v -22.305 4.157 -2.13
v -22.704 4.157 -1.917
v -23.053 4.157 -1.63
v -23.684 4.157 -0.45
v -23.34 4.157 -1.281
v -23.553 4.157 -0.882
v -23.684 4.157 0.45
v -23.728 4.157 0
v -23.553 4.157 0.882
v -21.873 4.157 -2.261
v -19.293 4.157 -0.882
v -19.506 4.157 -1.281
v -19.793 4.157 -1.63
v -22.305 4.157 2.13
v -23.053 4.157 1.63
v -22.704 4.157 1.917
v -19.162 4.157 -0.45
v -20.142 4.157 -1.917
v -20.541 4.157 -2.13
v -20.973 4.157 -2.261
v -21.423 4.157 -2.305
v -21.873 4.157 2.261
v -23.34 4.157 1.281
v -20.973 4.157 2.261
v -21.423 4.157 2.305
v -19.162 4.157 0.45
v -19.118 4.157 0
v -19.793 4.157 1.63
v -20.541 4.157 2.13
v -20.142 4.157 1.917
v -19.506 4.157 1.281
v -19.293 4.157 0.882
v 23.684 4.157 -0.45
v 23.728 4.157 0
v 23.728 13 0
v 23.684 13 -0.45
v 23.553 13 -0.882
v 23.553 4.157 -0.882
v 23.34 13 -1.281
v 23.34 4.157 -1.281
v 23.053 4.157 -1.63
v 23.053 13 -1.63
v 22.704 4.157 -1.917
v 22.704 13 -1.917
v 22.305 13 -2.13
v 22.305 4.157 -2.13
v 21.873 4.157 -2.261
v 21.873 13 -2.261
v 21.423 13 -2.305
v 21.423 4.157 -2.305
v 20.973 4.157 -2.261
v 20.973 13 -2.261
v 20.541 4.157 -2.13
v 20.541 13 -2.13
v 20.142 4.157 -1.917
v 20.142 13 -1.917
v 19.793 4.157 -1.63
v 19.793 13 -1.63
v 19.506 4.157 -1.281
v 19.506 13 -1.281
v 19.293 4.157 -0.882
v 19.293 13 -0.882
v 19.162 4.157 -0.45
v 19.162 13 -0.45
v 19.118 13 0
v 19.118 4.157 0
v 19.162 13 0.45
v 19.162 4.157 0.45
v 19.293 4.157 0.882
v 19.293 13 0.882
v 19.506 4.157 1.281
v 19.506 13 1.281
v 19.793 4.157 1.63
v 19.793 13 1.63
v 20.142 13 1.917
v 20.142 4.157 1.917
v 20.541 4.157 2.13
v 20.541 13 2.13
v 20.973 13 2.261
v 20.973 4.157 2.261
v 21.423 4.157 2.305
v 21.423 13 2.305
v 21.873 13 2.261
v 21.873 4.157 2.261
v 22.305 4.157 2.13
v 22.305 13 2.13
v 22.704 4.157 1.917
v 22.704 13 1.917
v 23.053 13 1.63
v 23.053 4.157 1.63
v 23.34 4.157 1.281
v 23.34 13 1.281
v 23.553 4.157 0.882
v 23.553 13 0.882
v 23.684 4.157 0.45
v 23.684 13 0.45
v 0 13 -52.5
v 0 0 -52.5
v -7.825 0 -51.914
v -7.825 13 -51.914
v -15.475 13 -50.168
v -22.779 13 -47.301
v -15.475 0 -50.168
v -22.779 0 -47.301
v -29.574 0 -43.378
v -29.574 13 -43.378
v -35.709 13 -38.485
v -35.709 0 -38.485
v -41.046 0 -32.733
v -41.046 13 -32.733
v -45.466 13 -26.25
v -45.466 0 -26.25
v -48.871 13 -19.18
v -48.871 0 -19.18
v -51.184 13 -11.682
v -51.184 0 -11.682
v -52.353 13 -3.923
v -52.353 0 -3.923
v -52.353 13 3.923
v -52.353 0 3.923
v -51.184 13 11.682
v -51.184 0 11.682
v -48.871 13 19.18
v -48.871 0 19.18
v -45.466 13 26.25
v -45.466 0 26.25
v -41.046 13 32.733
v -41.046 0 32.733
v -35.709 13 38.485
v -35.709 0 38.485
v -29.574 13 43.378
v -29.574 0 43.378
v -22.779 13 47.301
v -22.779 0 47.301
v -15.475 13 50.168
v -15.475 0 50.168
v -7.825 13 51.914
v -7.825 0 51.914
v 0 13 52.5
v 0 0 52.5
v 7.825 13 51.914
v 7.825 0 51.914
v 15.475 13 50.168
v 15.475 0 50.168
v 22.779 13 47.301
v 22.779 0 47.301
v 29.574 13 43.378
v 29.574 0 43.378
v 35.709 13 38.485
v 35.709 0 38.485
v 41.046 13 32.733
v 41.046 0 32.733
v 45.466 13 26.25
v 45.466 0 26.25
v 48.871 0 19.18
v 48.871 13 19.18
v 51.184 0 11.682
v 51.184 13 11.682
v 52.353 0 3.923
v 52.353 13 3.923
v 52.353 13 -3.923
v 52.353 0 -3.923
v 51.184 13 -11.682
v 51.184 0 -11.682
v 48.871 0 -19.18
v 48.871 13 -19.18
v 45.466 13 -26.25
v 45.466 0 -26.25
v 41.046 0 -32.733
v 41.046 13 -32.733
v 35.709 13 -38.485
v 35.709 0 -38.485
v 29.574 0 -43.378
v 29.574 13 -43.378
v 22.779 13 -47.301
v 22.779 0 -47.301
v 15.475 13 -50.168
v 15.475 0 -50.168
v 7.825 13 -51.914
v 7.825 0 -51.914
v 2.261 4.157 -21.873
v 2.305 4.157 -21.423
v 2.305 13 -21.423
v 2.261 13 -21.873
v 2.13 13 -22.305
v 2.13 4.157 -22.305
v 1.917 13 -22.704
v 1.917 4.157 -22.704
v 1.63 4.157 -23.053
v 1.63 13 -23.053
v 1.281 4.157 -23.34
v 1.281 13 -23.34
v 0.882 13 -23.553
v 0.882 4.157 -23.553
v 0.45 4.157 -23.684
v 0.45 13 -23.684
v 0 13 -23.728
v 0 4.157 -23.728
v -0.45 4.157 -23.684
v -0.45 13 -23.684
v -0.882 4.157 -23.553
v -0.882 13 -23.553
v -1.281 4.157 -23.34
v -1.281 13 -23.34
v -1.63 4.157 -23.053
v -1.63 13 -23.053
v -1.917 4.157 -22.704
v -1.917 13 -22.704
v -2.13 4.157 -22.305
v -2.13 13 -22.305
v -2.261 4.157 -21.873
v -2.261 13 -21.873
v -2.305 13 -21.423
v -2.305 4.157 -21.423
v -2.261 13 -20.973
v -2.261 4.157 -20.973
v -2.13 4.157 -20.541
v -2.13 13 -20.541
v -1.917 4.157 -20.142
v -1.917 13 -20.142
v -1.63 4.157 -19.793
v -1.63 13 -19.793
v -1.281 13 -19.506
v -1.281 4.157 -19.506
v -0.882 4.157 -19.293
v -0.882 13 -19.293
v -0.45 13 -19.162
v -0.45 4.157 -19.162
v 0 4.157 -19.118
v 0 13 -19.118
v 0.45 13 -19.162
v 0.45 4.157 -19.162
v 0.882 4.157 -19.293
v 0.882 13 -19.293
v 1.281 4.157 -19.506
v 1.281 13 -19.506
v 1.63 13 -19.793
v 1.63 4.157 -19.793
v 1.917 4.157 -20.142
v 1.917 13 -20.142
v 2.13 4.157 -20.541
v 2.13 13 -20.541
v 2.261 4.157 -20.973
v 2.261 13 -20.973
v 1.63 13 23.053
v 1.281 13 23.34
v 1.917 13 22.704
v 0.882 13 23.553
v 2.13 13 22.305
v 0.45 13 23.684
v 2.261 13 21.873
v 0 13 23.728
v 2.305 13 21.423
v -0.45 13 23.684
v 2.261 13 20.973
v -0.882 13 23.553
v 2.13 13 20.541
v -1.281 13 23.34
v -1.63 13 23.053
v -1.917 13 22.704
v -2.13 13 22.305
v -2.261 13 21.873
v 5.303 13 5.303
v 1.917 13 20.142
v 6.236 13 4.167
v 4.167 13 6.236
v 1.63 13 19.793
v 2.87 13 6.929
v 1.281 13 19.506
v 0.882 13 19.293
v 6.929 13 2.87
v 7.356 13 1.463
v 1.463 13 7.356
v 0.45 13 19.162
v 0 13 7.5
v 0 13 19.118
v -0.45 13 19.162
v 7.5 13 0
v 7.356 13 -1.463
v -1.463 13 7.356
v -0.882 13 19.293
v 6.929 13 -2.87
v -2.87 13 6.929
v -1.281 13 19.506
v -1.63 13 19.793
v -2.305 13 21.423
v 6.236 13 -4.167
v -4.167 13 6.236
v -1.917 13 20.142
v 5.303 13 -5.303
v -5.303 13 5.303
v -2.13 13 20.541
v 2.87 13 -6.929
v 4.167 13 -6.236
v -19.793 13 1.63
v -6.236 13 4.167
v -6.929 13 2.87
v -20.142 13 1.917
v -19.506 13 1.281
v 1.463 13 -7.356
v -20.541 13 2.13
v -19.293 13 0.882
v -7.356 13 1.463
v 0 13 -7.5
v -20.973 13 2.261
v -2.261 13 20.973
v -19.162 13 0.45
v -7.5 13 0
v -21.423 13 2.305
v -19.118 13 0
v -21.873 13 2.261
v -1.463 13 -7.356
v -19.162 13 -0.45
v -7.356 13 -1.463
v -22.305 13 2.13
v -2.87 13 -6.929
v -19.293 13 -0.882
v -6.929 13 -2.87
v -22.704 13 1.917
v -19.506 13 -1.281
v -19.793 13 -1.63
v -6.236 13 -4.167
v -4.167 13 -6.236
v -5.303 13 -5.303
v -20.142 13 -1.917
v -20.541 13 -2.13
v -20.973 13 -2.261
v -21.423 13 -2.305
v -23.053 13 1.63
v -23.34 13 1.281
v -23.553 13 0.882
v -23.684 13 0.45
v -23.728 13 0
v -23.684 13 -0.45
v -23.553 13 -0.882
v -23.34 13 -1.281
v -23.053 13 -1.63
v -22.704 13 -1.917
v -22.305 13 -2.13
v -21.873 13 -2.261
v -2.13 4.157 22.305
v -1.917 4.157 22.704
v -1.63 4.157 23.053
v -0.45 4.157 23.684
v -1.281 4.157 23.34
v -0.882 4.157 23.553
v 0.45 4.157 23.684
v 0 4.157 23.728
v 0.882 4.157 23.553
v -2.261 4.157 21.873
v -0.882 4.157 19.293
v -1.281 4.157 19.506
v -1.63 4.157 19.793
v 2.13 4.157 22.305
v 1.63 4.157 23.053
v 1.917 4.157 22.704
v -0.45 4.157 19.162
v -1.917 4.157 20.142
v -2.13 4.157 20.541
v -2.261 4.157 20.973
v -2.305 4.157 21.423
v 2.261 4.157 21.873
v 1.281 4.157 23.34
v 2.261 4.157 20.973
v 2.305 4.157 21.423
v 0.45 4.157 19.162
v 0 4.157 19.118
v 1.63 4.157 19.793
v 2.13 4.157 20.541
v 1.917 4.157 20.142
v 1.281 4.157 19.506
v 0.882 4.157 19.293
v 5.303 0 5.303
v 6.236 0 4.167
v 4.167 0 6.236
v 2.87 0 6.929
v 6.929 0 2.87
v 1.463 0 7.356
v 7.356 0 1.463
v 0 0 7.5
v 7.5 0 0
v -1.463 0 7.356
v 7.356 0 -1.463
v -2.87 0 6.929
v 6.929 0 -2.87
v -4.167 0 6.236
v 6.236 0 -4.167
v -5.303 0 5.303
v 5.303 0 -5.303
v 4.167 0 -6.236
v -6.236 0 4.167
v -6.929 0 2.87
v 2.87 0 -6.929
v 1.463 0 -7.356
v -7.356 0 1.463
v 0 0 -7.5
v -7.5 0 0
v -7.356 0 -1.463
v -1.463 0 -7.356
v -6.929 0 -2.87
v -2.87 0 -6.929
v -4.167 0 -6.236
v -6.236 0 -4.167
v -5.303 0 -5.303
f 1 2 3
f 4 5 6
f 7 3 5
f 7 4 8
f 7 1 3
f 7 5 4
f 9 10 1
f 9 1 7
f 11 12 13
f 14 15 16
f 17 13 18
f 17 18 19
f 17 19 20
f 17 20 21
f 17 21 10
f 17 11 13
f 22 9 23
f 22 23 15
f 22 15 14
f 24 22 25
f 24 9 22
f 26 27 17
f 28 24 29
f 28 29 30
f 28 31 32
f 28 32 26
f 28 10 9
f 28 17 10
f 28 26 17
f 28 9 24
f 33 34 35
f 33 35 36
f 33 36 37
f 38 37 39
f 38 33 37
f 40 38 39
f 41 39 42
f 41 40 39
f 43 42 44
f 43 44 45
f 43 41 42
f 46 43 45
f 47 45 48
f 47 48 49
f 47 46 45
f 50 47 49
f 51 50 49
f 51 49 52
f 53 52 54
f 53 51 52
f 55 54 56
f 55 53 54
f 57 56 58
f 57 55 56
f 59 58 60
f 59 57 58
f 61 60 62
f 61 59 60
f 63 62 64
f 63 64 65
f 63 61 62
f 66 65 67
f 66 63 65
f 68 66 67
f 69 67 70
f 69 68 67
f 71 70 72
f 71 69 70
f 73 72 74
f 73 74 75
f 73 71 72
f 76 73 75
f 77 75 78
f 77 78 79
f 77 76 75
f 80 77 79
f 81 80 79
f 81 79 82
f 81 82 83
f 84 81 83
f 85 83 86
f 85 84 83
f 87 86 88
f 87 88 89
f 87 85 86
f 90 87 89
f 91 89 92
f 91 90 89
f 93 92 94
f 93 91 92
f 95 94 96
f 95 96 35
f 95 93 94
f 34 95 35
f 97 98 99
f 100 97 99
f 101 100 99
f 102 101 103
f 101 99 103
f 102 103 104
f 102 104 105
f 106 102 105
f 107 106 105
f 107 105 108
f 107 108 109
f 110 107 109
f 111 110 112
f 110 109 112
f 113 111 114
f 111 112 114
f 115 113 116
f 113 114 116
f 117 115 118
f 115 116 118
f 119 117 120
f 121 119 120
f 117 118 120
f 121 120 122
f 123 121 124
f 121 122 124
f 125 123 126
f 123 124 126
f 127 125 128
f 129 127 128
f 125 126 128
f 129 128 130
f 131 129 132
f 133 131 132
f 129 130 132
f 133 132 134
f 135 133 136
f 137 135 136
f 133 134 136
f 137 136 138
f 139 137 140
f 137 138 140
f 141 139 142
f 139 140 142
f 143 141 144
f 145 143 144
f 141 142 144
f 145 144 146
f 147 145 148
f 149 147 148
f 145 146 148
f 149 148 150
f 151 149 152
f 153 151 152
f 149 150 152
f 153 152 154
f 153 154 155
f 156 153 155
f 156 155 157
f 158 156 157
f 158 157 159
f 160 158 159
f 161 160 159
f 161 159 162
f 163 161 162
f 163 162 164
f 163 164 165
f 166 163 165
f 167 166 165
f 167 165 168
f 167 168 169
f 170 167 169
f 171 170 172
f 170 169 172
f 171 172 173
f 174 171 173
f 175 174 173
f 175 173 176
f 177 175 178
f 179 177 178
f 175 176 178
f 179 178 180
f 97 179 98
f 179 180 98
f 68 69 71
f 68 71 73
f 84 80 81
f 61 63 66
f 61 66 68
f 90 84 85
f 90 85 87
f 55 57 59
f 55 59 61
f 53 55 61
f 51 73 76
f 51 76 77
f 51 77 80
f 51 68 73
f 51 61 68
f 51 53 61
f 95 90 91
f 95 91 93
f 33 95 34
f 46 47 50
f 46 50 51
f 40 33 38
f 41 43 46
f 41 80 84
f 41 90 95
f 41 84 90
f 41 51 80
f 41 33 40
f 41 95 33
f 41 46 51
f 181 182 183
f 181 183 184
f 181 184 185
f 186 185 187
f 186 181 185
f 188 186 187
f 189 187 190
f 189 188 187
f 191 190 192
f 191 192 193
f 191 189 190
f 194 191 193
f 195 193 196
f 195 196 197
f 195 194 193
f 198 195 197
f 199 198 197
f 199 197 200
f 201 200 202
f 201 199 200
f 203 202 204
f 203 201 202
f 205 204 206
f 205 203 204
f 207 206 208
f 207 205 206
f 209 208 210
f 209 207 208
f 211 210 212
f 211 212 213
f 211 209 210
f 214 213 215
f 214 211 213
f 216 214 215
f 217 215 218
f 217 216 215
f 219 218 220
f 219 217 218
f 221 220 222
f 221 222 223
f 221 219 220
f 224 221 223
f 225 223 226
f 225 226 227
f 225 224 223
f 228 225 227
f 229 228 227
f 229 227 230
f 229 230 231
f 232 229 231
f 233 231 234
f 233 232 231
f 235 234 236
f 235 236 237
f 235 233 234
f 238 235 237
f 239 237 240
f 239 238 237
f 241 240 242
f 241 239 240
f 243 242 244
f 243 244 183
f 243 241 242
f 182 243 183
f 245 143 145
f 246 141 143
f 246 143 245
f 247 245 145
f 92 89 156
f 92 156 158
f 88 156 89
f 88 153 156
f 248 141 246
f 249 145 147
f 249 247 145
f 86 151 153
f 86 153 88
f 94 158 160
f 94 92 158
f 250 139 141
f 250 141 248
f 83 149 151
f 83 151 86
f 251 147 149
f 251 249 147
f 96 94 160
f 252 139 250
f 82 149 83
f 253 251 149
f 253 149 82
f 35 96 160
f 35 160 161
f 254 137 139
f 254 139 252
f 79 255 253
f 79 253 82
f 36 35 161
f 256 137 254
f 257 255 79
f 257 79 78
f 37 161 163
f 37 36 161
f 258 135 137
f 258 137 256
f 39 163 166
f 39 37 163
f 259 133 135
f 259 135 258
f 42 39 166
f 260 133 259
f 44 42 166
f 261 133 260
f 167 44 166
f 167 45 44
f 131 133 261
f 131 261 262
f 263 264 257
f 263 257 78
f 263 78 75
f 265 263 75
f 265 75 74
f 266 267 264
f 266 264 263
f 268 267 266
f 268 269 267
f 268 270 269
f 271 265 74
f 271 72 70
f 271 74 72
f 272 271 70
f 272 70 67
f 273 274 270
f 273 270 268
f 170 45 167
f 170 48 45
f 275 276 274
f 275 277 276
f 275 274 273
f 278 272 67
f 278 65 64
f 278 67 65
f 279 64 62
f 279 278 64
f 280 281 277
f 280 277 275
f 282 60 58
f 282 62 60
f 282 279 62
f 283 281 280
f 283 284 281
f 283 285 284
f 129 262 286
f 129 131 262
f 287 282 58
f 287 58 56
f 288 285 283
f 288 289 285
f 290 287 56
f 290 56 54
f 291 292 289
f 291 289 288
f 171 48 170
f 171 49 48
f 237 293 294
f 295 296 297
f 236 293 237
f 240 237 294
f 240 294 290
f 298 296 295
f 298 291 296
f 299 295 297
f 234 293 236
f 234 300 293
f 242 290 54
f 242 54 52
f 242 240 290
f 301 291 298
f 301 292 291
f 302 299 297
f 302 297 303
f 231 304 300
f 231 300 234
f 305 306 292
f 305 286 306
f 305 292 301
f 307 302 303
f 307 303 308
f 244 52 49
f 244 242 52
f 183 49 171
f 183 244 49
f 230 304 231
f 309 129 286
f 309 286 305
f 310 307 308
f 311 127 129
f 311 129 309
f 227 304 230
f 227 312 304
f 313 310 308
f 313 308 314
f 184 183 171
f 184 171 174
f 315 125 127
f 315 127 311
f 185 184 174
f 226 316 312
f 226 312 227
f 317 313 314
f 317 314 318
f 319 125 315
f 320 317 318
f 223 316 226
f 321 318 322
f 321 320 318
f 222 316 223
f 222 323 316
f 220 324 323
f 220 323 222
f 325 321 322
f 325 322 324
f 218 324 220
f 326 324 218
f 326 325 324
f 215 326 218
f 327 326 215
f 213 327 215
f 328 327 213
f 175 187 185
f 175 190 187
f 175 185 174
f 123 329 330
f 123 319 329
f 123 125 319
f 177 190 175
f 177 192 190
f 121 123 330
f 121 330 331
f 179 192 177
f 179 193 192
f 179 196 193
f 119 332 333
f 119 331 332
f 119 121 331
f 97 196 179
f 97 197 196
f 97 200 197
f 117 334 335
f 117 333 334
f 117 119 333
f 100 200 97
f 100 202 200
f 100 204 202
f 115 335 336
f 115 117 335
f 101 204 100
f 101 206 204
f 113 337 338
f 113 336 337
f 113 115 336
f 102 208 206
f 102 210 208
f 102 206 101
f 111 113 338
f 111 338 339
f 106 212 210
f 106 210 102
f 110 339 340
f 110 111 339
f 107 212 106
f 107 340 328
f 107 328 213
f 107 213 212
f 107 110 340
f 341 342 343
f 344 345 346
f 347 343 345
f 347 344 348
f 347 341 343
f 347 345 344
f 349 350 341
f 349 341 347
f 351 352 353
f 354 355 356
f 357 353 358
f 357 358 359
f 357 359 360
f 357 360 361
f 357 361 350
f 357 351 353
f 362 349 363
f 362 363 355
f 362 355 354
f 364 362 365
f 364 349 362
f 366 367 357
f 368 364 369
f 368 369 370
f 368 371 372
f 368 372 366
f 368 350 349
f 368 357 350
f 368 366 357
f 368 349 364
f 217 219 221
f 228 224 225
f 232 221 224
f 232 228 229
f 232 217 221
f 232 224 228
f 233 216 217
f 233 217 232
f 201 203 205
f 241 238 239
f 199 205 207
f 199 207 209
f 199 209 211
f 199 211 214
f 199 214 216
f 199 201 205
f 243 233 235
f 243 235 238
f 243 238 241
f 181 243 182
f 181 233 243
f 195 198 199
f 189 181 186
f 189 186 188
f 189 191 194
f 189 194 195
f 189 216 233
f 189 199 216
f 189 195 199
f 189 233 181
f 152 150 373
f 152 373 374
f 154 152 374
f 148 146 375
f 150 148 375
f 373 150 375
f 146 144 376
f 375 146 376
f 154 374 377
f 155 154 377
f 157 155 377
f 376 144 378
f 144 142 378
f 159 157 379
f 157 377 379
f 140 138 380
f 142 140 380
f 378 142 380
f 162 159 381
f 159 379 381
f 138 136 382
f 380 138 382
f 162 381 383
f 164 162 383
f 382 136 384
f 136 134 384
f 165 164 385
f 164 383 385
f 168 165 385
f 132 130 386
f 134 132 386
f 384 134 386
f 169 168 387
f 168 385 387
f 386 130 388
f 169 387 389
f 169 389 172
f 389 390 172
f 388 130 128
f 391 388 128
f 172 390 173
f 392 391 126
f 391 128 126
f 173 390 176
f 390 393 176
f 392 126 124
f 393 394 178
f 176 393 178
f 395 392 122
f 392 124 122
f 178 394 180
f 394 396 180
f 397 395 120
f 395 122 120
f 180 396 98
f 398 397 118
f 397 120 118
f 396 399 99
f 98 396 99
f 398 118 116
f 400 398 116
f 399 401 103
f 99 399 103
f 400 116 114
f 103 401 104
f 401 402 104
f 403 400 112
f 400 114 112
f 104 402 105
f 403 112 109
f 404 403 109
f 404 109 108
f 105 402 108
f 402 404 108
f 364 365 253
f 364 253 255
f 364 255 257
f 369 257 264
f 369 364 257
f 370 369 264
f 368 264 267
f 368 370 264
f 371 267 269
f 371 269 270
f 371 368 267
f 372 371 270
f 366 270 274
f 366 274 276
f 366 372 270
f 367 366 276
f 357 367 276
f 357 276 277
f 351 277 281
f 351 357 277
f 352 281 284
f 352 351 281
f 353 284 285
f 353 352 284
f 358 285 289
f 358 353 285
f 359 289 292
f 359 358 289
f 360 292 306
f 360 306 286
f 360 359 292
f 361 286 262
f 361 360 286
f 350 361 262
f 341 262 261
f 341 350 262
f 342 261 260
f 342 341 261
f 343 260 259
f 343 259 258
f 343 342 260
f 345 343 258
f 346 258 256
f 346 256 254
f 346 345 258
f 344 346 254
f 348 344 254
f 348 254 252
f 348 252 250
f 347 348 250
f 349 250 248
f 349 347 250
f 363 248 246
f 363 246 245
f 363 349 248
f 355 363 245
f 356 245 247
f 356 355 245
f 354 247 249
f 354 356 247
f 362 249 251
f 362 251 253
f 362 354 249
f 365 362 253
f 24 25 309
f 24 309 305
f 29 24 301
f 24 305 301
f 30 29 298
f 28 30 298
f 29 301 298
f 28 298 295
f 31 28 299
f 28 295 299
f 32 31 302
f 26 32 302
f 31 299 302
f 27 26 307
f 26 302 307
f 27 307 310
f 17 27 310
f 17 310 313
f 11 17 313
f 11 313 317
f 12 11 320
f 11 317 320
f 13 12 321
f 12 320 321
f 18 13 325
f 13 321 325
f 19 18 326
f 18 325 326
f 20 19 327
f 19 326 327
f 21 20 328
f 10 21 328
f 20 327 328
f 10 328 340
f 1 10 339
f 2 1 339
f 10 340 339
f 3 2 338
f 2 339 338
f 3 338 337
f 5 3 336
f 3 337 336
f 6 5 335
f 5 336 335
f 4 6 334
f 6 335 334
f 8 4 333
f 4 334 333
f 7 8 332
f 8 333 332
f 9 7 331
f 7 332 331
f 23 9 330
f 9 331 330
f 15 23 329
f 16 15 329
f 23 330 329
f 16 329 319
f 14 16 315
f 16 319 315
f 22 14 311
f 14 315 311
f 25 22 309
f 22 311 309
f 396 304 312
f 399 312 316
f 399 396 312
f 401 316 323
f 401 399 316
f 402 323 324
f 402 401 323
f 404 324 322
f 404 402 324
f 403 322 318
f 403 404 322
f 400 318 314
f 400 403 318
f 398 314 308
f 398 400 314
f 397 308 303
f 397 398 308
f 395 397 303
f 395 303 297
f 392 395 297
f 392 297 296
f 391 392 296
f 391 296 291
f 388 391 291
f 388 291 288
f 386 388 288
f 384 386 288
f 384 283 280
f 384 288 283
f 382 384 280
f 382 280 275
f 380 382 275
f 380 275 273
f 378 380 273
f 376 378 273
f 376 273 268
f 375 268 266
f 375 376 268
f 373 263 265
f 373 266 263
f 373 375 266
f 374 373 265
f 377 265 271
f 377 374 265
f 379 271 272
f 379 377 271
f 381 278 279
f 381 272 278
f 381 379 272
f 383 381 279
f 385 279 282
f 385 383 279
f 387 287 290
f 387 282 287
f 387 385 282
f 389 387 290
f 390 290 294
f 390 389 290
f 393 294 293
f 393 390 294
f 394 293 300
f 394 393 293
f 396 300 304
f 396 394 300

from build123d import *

# Parameters (mm, degrees)
SKETCH1_R           = 52.5
BOSS_EXTRUDE1_DEPTH = 13
SKETCH2_R           = 7.5
CUT_EXTRUDE1_DEPTH  = 76.375725535
SKETCH3_R           = 2.305159733
CUT_EXTRUDE2_DEPTH  = 8.842975373
CIRPATTERN1_COUNT   = 4


with BuildPart() as part:
    # Sketch1 → Boss-Extrude1 (new body)
    with BuildSketch(Plane(origin=(0, 0, 0), x_dir=(1, 0, 0), z_dir=(0, 1, 0))):
        Circle(SKETCH1_R)
    extrude(amount=BOSS_EXTRUDE1_DEPTH)

    # Sketch2 → Cut-Extrude1 (cut, through all)
    with BuildSketch(Plane(origin=(0, 0, 0), x_dir=(1, 0, 0), z_dir=(0, 1, 0))):
        Circle(SKETCH2_R)
    extrude(amount=CUT_EXTRUDE1_DEPTH, mode=Mode.SUBTRACT)

    # Sketch3 → Cut-Extrude2 (cut)
    with BuildSketch(Plane(origin=(0, 13, 0), x_dir=(1, 0, 0), z_dir=(0, 1, 0))):
        with Locations((-21.422945149, 0)):
            Circle(SKETCH3_R)
    cut_extrude2 = extrude(amount=-CUT_EXTRUDE2_DEPTH, mode=Mode.SUBTRACT)

    # CirPattern1: Cut-Extrude2 ×4 about axis
    cirpattern1_axis = Axis((0, 0, 0), (0, 1, 0))
    for i in range(1, CIRPATTERN1_COUNT):
        add(cut_extrude2.rotate(cirpattern1_axis, i * 360 / CIRPATTERN1_COUNT), mode=Mode.SUBTRACT)


solid = part.part
